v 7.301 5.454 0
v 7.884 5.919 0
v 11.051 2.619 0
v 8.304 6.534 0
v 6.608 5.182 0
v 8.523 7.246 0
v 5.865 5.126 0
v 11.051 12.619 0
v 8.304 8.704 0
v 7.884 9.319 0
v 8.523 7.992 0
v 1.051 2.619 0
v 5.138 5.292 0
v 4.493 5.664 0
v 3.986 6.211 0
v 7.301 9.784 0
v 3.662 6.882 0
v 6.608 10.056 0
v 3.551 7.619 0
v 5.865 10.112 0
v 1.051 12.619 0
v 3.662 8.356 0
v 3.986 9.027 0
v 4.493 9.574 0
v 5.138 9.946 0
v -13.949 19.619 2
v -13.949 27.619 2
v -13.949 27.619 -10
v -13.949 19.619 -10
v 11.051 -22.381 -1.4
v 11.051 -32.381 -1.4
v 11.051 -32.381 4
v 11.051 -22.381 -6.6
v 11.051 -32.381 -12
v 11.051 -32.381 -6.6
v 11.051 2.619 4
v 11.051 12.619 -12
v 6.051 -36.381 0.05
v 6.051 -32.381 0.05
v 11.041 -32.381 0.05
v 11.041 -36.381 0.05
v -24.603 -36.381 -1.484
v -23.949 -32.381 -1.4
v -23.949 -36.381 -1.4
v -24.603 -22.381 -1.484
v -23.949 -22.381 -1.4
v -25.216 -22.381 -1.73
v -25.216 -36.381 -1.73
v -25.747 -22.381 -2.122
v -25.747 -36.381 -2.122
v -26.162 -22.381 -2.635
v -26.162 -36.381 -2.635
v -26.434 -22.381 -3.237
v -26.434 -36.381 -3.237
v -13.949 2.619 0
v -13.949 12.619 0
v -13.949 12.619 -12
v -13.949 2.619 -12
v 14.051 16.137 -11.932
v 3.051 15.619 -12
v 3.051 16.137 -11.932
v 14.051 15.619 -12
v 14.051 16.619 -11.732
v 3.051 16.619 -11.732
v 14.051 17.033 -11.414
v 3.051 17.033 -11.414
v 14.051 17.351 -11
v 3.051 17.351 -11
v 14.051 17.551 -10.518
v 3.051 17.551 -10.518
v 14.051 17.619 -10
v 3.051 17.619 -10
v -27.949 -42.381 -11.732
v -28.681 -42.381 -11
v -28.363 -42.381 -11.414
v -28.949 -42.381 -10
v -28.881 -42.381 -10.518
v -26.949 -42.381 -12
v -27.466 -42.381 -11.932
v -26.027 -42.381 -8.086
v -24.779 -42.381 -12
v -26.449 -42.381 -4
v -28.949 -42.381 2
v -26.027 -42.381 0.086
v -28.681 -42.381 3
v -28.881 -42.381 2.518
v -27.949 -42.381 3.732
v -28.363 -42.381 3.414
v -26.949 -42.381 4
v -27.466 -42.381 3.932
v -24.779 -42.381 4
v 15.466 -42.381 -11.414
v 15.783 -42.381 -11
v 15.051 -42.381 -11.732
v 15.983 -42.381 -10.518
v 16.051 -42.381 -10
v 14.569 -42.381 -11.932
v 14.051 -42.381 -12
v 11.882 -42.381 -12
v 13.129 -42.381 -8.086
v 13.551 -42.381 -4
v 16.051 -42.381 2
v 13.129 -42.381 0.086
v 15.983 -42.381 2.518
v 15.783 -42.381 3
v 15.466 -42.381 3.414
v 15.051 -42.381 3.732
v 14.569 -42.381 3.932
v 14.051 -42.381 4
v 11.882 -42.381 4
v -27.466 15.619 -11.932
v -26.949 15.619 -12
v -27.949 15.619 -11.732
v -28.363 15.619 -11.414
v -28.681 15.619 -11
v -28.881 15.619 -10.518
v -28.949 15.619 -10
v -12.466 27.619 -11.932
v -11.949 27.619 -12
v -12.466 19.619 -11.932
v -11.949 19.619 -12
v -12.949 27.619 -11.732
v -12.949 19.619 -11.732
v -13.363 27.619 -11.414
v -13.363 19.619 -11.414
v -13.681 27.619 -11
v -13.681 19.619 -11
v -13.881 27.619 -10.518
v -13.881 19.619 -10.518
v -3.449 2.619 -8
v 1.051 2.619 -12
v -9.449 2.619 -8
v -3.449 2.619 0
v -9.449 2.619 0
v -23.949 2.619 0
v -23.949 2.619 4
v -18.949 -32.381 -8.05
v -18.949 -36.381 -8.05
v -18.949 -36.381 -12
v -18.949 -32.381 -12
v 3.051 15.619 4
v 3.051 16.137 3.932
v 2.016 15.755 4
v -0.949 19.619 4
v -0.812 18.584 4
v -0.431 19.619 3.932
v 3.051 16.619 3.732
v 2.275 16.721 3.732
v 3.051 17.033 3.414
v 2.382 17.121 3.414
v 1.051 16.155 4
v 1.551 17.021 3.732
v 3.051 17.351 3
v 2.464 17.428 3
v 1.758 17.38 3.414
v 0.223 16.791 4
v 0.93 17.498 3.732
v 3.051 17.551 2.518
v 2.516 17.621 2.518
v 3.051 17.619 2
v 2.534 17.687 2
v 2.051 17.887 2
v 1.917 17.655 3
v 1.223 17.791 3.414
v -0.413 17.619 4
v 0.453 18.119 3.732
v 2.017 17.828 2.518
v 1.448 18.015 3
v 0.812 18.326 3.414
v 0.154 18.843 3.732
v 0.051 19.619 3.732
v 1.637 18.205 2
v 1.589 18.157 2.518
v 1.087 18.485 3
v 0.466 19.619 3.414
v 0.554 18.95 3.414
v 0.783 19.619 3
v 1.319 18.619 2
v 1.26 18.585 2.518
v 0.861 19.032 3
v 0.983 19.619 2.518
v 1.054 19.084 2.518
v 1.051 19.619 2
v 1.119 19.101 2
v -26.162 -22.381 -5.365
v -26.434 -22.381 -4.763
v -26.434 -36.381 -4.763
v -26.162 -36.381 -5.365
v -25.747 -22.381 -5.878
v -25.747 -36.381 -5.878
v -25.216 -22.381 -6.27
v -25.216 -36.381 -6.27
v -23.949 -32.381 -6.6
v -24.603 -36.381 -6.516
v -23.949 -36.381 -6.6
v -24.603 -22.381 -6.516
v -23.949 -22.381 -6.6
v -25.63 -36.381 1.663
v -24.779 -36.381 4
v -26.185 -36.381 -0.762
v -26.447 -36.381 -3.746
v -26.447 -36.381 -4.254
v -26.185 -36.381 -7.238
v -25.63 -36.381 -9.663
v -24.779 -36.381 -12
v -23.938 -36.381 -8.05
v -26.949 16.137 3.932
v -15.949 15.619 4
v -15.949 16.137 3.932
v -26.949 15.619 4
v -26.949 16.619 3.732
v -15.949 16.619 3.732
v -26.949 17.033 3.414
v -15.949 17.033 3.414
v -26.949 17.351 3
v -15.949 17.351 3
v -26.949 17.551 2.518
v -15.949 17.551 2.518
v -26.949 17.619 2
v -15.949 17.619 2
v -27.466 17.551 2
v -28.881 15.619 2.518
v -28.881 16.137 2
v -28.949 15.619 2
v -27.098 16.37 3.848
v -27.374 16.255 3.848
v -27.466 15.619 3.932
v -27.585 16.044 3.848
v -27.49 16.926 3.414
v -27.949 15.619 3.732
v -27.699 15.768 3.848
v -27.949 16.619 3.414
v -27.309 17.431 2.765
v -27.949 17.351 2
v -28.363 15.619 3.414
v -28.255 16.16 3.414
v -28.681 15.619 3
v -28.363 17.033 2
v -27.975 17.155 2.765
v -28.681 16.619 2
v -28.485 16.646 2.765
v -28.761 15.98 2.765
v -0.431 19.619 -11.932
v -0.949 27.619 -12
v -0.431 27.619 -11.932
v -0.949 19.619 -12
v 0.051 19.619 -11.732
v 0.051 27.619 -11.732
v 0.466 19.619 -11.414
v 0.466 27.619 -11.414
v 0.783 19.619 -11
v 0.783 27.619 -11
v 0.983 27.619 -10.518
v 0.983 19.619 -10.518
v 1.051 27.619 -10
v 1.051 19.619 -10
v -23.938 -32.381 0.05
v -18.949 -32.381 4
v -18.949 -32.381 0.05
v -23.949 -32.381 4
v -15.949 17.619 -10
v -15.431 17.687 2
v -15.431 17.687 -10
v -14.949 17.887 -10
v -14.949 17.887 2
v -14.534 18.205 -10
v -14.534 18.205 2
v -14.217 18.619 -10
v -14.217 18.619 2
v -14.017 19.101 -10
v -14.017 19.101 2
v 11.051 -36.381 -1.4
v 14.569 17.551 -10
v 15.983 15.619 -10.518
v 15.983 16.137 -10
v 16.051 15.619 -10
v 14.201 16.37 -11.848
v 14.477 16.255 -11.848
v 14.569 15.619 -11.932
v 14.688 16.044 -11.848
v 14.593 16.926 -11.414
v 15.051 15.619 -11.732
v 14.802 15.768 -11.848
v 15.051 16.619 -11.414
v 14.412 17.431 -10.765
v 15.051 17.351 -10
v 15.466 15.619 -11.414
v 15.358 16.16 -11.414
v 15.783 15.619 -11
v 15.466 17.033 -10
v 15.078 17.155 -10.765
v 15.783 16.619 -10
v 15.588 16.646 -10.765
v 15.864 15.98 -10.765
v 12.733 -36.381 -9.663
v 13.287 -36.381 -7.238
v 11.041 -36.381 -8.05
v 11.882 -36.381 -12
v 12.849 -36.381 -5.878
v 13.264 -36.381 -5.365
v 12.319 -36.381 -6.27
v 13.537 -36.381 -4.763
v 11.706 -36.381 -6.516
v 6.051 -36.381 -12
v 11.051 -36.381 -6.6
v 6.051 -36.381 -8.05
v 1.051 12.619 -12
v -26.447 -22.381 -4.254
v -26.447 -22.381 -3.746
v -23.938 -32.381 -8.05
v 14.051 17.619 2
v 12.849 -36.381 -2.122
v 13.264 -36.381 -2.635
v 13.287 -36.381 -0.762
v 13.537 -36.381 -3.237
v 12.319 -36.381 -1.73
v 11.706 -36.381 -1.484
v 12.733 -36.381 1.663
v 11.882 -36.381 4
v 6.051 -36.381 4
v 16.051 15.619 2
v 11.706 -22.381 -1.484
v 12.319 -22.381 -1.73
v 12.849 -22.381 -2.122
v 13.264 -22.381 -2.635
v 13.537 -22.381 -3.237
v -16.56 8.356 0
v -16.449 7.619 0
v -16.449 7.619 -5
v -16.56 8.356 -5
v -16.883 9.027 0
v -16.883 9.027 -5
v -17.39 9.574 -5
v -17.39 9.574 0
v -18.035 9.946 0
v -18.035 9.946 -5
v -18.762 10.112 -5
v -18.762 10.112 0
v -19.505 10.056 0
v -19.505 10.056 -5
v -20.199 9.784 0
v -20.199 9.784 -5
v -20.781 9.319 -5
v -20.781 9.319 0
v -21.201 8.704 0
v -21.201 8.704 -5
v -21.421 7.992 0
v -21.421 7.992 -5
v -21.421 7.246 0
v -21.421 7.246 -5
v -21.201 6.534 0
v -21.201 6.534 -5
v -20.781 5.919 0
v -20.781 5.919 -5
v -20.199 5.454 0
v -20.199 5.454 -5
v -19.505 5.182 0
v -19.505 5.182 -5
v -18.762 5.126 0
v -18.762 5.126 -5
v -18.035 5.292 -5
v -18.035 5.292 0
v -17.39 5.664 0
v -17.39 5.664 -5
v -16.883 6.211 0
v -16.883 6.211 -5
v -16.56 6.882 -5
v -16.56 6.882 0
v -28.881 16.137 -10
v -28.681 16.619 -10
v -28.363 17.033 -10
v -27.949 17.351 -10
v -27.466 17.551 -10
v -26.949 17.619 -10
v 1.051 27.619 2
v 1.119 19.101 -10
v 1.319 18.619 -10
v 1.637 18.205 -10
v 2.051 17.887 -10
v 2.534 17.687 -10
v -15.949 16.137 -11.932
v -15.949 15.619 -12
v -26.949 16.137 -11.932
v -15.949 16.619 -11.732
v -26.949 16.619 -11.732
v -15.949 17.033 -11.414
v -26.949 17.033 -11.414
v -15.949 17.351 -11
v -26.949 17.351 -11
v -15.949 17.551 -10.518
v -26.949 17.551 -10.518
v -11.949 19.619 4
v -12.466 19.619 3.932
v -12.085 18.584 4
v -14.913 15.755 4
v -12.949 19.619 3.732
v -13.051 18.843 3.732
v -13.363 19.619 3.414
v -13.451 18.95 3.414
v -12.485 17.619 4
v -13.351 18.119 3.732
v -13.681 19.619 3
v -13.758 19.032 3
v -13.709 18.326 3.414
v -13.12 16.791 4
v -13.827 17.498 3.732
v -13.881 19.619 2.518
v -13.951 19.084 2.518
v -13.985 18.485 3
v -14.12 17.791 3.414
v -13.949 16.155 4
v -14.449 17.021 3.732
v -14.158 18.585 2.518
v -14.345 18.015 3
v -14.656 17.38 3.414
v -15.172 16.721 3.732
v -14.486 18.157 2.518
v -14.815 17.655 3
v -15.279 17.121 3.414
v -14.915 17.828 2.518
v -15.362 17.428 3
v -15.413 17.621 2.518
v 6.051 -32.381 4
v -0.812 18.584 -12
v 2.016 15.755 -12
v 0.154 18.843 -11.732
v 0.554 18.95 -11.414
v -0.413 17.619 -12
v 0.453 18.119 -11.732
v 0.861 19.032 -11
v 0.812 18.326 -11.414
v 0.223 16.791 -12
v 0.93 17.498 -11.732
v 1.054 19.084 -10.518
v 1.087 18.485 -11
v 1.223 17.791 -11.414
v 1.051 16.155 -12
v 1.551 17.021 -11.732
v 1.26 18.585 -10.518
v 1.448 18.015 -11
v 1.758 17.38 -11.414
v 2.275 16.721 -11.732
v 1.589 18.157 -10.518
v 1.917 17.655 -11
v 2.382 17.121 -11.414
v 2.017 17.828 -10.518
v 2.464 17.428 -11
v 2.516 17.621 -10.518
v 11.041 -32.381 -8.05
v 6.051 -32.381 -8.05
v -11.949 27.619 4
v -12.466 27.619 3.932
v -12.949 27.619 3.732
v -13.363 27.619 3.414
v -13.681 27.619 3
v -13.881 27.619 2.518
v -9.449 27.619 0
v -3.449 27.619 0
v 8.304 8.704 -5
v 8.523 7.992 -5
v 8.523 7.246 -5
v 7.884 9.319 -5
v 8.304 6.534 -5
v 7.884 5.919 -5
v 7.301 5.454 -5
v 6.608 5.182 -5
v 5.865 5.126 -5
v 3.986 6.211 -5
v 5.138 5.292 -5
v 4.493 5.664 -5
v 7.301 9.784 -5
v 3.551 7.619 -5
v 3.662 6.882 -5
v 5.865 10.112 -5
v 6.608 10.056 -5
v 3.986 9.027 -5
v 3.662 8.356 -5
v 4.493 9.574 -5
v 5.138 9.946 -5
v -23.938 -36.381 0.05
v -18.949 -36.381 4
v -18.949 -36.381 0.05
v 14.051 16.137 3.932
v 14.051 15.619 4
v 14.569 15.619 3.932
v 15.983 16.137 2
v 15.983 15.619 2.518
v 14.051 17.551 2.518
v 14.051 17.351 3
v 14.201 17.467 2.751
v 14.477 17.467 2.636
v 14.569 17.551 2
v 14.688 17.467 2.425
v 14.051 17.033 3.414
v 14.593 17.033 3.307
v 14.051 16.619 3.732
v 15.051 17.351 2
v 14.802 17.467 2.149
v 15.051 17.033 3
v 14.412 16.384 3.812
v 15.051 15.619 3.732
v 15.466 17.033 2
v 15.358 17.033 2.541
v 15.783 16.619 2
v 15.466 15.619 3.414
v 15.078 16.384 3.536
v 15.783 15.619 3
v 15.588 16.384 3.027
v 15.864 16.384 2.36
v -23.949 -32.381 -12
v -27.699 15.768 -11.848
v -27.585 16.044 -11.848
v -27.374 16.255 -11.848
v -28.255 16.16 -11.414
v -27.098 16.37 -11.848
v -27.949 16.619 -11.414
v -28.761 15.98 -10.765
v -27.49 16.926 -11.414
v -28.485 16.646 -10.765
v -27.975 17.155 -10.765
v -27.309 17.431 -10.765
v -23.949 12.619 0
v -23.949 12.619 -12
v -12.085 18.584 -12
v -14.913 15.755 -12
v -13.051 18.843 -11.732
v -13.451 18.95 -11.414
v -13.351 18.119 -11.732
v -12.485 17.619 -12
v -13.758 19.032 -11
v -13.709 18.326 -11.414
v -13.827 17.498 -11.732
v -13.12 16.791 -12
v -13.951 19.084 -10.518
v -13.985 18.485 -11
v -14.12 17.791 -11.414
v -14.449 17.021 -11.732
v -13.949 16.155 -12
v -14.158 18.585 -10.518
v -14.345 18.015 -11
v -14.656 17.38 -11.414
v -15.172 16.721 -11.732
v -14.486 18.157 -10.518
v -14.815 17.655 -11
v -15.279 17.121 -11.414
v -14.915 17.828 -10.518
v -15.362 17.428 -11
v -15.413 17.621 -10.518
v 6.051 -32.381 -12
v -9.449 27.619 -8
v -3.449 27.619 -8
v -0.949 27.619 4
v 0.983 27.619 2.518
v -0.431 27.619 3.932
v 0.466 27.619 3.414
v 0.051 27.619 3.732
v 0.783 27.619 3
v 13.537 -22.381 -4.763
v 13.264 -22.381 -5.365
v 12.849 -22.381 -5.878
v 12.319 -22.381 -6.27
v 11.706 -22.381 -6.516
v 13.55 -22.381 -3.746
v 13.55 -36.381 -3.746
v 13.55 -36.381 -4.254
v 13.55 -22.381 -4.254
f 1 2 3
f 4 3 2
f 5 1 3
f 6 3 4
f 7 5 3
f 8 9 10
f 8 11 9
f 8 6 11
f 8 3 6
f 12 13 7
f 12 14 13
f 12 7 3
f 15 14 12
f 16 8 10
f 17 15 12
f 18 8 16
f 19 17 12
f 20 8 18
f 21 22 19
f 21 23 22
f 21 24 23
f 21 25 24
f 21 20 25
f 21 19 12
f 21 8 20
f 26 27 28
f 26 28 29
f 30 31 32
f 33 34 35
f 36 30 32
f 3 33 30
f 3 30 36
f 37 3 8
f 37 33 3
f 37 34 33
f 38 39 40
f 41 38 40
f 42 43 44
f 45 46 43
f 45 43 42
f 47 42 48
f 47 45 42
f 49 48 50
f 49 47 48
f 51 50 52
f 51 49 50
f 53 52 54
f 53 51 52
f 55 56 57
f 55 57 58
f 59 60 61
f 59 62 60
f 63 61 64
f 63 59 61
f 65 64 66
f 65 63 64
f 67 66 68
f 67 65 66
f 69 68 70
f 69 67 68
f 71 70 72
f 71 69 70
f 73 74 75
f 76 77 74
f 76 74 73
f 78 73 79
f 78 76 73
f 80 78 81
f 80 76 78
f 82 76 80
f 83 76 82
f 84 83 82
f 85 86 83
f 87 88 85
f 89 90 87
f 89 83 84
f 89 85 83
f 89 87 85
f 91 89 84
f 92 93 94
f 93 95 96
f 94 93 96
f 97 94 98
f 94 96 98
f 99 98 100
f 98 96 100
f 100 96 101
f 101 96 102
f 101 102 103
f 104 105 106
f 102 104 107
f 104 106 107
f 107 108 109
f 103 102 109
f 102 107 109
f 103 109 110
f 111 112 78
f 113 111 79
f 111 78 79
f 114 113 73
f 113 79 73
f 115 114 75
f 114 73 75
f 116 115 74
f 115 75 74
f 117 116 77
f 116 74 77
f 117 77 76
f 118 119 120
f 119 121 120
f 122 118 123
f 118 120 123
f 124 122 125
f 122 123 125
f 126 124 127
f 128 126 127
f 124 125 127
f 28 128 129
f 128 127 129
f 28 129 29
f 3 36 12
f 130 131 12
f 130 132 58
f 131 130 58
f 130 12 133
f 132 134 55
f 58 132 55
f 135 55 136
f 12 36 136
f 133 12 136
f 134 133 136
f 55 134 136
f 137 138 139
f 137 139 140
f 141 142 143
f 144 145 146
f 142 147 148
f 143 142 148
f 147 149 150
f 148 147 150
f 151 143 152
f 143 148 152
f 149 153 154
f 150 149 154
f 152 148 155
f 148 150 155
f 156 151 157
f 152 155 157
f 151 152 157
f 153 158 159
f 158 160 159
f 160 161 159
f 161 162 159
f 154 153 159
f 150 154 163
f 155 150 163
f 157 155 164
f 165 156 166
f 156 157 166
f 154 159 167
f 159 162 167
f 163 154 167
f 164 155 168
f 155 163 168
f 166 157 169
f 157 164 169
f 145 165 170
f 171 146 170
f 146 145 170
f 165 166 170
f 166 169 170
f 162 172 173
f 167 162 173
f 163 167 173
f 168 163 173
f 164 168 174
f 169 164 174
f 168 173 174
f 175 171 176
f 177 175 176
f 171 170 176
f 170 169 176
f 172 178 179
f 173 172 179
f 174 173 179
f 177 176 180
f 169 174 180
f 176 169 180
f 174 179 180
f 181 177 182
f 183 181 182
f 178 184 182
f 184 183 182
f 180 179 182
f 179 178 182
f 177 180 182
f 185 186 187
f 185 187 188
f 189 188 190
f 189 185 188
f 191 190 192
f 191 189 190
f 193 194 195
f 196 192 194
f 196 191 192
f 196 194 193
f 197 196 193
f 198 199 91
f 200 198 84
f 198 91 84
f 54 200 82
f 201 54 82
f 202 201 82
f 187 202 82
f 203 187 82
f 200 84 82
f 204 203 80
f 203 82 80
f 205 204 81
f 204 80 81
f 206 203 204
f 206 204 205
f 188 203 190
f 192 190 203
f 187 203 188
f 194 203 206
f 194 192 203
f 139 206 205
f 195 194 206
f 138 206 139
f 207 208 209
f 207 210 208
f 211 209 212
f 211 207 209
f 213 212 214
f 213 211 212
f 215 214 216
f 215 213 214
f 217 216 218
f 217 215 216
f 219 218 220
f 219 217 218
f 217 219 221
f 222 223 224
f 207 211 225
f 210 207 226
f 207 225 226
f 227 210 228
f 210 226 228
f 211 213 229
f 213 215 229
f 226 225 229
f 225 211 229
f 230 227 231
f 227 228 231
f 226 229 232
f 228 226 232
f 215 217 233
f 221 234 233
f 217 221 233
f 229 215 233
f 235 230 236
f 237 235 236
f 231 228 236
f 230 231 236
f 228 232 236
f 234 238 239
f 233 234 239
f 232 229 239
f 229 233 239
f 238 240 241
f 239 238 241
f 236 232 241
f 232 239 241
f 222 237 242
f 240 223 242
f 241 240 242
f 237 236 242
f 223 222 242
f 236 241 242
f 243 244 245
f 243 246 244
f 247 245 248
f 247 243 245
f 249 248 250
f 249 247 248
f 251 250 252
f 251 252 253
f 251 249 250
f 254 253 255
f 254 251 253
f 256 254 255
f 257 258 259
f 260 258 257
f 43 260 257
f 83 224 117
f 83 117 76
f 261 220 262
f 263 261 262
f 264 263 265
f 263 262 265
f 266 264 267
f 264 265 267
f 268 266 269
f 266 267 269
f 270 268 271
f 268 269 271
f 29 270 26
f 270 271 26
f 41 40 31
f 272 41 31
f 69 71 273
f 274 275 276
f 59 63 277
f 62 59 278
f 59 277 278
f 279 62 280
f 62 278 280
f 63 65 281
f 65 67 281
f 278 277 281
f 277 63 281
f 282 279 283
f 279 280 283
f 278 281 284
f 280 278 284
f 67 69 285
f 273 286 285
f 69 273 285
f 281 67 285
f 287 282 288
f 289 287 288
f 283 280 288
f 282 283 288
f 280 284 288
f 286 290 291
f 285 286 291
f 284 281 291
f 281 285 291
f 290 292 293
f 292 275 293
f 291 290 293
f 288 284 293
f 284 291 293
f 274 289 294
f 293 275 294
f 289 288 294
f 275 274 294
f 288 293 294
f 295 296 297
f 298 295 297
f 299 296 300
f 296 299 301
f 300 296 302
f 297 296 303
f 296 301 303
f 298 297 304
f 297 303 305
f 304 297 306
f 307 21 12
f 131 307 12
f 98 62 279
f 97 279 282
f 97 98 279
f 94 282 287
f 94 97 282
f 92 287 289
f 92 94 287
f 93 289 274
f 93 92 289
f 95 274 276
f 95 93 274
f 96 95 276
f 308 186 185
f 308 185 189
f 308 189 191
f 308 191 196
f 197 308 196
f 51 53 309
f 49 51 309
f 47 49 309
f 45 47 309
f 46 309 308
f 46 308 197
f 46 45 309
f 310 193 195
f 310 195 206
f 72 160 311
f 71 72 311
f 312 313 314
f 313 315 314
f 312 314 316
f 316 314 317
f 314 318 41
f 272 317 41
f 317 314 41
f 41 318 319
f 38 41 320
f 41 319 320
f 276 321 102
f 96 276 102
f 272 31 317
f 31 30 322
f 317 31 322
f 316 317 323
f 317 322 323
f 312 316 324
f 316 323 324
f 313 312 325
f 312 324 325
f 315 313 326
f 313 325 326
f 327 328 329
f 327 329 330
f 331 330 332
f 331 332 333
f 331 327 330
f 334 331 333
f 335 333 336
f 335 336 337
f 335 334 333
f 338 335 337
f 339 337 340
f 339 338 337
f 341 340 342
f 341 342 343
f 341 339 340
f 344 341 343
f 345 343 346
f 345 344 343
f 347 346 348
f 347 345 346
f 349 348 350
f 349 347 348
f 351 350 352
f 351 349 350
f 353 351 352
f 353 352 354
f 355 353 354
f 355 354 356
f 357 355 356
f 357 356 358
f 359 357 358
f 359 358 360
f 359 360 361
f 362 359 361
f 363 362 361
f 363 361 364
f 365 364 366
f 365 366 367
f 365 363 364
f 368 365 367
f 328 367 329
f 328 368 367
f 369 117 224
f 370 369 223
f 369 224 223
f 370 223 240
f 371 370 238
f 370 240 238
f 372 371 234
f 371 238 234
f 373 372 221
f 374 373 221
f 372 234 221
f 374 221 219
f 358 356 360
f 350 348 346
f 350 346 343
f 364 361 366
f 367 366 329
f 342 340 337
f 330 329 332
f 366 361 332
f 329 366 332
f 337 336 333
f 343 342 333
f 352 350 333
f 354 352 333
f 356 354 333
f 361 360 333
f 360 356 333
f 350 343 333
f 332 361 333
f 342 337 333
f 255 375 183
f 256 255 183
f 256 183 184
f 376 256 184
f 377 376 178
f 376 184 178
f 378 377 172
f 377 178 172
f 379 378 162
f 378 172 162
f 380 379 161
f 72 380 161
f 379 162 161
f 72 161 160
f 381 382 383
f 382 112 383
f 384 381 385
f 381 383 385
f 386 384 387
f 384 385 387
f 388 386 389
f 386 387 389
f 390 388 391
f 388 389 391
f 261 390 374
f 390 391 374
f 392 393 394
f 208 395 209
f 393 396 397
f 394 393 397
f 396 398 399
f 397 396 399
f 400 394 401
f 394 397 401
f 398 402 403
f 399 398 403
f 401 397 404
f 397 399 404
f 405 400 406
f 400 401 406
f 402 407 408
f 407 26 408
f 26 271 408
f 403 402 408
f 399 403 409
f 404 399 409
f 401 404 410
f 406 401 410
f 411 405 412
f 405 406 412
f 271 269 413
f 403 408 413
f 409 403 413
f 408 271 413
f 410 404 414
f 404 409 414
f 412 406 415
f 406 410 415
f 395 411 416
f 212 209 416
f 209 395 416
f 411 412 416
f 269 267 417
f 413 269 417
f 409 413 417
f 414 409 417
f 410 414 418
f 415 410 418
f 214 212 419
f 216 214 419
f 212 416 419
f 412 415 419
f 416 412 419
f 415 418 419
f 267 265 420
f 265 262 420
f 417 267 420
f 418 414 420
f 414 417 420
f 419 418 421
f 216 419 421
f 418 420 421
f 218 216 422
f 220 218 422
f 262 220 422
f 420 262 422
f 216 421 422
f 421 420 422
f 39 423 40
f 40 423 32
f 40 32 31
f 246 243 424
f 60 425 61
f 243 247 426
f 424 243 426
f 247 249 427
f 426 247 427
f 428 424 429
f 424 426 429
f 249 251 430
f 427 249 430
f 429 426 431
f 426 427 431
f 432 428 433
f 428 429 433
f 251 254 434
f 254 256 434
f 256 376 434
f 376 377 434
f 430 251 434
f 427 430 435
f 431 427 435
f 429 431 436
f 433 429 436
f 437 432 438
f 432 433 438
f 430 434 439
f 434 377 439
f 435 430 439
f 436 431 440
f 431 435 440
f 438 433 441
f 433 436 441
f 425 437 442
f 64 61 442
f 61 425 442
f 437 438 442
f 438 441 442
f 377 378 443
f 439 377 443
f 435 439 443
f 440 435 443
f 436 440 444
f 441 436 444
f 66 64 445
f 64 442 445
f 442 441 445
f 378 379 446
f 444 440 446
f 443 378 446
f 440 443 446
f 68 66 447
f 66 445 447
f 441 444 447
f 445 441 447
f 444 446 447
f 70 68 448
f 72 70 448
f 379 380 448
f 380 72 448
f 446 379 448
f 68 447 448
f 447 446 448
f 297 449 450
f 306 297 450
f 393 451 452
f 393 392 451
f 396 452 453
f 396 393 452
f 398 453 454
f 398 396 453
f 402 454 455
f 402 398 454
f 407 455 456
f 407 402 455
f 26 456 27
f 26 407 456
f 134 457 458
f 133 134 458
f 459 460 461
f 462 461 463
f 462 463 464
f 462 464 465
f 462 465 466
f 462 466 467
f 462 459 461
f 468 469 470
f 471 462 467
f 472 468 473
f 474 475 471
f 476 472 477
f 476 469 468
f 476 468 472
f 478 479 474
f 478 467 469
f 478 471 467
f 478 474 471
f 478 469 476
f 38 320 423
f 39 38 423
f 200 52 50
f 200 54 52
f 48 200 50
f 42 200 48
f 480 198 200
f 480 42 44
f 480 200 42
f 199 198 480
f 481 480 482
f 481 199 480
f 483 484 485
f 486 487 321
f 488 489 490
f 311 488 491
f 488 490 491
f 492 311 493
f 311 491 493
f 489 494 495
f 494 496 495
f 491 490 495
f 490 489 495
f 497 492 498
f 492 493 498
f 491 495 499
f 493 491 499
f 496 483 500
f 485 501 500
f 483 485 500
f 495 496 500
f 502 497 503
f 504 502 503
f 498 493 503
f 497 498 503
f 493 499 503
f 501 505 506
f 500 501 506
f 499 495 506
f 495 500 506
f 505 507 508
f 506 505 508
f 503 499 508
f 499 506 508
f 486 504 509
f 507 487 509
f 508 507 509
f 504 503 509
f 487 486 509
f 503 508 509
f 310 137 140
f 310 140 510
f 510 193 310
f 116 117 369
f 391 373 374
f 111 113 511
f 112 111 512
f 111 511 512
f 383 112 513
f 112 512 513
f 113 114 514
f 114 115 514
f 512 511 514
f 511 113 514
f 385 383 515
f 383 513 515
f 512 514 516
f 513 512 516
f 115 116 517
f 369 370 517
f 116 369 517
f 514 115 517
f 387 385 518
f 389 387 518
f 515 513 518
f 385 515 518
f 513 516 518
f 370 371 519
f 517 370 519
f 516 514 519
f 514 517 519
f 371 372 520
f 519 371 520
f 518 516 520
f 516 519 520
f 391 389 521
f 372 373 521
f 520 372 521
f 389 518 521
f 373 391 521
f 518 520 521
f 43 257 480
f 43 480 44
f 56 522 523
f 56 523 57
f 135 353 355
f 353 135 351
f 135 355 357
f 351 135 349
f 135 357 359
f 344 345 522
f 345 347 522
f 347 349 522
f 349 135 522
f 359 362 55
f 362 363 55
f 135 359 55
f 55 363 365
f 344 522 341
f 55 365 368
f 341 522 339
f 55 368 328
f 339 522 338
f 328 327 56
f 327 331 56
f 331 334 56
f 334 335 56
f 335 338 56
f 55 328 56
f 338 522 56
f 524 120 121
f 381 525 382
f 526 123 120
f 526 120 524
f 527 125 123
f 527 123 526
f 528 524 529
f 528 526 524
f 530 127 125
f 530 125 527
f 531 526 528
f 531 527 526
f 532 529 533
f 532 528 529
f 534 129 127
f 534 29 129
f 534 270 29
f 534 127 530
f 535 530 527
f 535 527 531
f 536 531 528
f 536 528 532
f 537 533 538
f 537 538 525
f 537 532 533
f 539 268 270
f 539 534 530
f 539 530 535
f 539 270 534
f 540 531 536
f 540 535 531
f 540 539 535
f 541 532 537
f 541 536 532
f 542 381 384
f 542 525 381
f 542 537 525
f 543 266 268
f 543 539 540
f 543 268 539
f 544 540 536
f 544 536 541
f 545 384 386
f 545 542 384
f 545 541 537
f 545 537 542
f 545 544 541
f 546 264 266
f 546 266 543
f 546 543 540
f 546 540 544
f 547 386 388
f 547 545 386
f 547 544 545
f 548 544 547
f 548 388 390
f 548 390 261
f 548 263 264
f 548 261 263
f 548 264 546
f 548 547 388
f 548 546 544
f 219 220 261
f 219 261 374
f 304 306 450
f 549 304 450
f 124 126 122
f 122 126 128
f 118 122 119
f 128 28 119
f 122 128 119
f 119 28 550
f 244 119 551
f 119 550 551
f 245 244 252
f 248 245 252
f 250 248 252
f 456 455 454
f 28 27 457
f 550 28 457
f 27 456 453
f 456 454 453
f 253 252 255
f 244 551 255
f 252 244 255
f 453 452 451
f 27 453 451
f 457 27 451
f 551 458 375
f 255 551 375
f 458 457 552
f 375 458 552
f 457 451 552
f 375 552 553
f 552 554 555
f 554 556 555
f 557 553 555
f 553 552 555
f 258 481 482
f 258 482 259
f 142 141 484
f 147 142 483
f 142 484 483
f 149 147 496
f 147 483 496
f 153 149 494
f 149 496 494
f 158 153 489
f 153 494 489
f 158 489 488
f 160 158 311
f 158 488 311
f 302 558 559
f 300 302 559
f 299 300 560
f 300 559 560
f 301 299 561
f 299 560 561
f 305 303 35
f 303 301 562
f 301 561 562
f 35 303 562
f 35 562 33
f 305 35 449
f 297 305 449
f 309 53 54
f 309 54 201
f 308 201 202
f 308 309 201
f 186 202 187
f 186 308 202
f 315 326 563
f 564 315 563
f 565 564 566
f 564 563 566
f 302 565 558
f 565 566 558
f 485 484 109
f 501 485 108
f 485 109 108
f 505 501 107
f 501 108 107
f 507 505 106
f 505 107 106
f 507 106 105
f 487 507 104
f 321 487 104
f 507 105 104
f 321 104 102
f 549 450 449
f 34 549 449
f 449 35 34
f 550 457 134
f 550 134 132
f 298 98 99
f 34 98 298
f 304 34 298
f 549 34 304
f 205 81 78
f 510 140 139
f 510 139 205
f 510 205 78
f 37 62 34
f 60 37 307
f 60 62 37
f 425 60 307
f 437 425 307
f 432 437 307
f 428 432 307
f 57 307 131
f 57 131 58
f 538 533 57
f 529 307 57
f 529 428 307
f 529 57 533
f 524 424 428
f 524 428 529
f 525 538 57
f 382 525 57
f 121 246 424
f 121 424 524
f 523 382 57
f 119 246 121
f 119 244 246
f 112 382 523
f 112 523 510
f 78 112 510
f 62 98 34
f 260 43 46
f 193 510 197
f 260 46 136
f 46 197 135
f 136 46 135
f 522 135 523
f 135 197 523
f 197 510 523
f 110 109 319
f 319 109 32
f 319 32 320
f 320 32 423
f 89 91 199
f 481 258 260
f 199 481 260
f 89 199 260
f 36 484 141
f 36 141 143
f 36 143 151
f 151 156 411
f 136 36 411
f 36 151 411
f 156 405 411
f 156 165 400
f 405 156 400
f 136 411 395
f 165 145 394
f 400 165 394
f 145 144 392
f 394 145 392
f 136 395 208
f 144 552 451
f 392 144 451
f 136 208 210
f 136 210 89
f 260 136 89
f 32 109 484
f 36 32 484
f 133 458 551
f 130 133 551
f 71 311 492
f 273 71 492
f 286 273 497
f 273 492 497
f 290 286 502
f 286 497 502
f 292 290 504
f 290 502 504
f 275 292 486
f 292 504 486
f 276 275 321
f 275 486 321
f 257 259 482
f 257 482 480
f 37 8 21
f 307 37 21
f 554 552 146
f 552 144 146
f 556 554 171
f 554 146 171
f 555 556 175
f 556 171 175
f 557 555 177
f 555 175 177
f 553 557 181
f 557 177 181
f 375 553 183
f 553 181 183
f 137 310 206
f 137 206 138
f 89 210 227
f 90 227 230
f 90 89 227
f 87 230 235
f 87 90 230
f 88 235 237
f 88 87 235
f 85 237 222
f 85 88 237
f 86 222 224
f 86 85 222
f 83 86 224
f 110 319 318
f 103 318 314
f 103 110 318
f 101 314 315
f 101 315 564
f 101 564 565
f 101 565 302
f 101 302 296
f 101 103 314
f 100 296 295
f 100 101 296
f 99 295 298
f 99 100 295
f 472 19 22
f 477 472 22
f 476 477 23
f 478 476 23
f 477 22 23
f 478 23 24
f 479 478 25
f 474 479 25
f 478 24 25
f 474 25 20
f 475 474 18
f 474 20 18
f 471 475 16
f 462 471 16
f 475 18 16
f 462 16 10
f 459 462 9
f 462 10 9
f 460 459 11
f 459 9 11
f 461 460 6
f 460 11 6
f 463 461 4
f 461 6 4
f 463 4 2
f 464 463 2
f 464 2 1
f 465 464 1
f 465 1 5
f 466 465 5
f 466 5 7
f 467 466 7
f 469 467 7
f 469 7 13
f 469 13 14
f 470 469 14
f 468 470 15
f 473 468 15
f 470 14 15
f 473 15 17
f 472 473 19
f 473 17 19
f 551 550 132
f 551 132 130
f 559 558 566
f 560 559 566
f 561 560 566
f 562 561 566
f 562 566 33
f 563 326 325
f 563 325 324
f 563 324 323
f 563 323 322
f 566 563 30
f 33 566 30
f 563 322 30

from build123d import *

# Parameters (mm, degrees)
EXTRUDE_1_DEPTH     = 4
EXTRUDE_2_DEPTH     = 12
CUT_EXTRUDE_1_DEPTH = 6
CUT_EXTRUDE_START   = -20
CUT_EXTRUDE_2_DEPTH = 14
SKETCH_1_5_R        = 2.5
EXTRUDE_3_DEPTH     = 5
SKETCH_7_W          = 6
SKETCH_7_H          = 8
CUT_EXTRUDE_3_DEPTH = 25
FILLET_2_R          = 2


# Read off the part's stored shape, not the designer's step: 切除-拉伸2, 镜向1
with BuildPart() as part:
    # 草图1 → 凸台-拉伸1 (new body)
    with BuildSketch(Plane.XY):
        Polygon((-6.44865866, 2.619047619), (-6.44865866, 27.619047619), (-13.94865866, 27.619047619), (-13.94865866, 17.619047619), (-28.94865866, 17.619047619), (-28.94865866, -42.380952381), (-18.94865866, -42.380952381), (-18.94865866, -32.380952381), (-23.94865866, -32.380952381), (-23.94865866, 2.619047619), align=None)
    extrude(amount=EXTRUDE_1_DEPTH)

    # 草图1<4> → 凸台-拉伸2 (add)
    with BuildSketch(Plane.XY):
        Polygon((-13.94865866, 2.619047619), (-6.44865866, 2.619047619), (-6.44865866, 27.619047619), (-13.94865866, 27.619047619), (-13.94865866, 17.619047619), (-28.94865866, 17.619047619), (-28.94865866, -42.380952381), (-18.94865866, -42.380952381), (-18.94865866, -32.380952381), (-23.94865866, -32.380952381), (-23.94865866, 2.619047619), (-23.94865866, 12.619047619), (-13.94865866, 12.619047619), align=None)
    extrude(amount=-EXTRUDE_2_DEPTH)

    # 草图5 → 切除-拉伸1 (cut)
    with BuildSketch(Plane.XZ.offset(42.380952381)):
        with BuildLine():
            Line((-18.94865866, 4), (-23.425219682, 4))
            Line((-23.425219682, 4), (-24.77896144, 4))
            ThreePointArc((-24.77896144, 4), (-26.44865866, -4), (-24.77896144, -12))
            Line((-24.77896144, -12), (-18.94865866, -12))
            Line((-18.94865866, -12), (-18.94865866, 4))
        make_face()
    extrude(amount=-CUT_EXTRUDE_1_DEPTH, mode=Mode.SUBTRACT)

    # 切除-拉伸2 outline → 切除-拉伸2 (cut)
    with BuildSketch(Plane.XZ.offset(42.380952381).offset(CUT_EXTRUDE_START)):
        with BuildLine():
            ThreePointArc((-23.94865866, -1.4), (-25.493875387, -1.908994198), (-26.434087232, -3.236688257))
            ThreePointArc((-26.434087232, -3.236688257), (-26.44865866, -4), (-26.434087231, -4.763311743))
            ThreePointArc((-26.434087231, -4.763311743), (-25.493875387, -6.091005802), (-23.94865866, -6.6))
            Line((-23.94865866, -6.6), (-23.938488984, -8.05))
            Line((-23.938488984, -8.05), (-18.94865866, -8.05))
            Line((-18.94865866, -8.05), (-18.94865866, 0.05))
            Line((-18.94865866, 0.05), (-23.938488984, 0.05))
            Line((-23.938488984, 0.05), (-23.94865866, -1.4))
        make_face()
    extrude(amount=CUT_EXTRUDE_2_DEPTH, mode=Mode.SUBTRACT)

    # 草图1<5> → 凸台-拉伸3 (add)
    with BuildSketch(Plane.XY):
        with Locations((-18.94865866, 7.619047619)):
            Circle(SKETCH_1_5_R)
    extrude(amount=-EXTRUDE_3_DEPTH)

    # 镜向1: part across plane


with BuildPart() as part_1:
    add(part.part)
    add(part.part.mirror(Plane(origin=(-6.44865866, 0, 4), x_dir=(0, 0, 1), z_dir=(1, 0, 0))))

    # 草图7 → 切除-拉伸3 (cut)
    with BuildSketch(Plane(origin=(0, 27.619047619, 0), x_dir=(1, 0, 0), z_dir=(0, 1, 0))):
        with Locations((-6.44865866, 4)):
            Rectangle(SKETCH_7_W, SKETCH_7_H)
    extrude(amount=-CUT_EXTRUDE_3_DEPTH, mode=Mode.SUBTRACT)

    # 圆角2
    fillet_2_edges = [part_1.edges().sort_by_distance(p)[0] for p in [
        (16.05134134, -12.380952381, 4),
        (8.55134134, 17.619047619, 4),
        (16.05134134, 17.619047619, -4),
        (1.05134134, 22.619047619, 4),
        (1.05134134, 17.619047619, -4),
        (1.05134134, 22.619047619, -12),
        (8.55134134, 17.619047619, -12),
        (16.05134134, -12.380952381, -12),
        (-28.94865866, 17.619047619, -4),
        (-13.94865866, 17.619047619, -4),
        (-13.94865866, 22.619047619, 4),
        (-21.44865866, 17.619047619, 4),
        (-28.94865866, -12.380952381, 4),
        (-13.94865866, 22.619047619, -12),
        (-28.94865866, -12.380952381, -12),
        (-21.44865866, 17.619047619, -12),
    ]]
    fillet(fillet_2_edges, radius=FILLET_2_R)


solid = part_1.part
